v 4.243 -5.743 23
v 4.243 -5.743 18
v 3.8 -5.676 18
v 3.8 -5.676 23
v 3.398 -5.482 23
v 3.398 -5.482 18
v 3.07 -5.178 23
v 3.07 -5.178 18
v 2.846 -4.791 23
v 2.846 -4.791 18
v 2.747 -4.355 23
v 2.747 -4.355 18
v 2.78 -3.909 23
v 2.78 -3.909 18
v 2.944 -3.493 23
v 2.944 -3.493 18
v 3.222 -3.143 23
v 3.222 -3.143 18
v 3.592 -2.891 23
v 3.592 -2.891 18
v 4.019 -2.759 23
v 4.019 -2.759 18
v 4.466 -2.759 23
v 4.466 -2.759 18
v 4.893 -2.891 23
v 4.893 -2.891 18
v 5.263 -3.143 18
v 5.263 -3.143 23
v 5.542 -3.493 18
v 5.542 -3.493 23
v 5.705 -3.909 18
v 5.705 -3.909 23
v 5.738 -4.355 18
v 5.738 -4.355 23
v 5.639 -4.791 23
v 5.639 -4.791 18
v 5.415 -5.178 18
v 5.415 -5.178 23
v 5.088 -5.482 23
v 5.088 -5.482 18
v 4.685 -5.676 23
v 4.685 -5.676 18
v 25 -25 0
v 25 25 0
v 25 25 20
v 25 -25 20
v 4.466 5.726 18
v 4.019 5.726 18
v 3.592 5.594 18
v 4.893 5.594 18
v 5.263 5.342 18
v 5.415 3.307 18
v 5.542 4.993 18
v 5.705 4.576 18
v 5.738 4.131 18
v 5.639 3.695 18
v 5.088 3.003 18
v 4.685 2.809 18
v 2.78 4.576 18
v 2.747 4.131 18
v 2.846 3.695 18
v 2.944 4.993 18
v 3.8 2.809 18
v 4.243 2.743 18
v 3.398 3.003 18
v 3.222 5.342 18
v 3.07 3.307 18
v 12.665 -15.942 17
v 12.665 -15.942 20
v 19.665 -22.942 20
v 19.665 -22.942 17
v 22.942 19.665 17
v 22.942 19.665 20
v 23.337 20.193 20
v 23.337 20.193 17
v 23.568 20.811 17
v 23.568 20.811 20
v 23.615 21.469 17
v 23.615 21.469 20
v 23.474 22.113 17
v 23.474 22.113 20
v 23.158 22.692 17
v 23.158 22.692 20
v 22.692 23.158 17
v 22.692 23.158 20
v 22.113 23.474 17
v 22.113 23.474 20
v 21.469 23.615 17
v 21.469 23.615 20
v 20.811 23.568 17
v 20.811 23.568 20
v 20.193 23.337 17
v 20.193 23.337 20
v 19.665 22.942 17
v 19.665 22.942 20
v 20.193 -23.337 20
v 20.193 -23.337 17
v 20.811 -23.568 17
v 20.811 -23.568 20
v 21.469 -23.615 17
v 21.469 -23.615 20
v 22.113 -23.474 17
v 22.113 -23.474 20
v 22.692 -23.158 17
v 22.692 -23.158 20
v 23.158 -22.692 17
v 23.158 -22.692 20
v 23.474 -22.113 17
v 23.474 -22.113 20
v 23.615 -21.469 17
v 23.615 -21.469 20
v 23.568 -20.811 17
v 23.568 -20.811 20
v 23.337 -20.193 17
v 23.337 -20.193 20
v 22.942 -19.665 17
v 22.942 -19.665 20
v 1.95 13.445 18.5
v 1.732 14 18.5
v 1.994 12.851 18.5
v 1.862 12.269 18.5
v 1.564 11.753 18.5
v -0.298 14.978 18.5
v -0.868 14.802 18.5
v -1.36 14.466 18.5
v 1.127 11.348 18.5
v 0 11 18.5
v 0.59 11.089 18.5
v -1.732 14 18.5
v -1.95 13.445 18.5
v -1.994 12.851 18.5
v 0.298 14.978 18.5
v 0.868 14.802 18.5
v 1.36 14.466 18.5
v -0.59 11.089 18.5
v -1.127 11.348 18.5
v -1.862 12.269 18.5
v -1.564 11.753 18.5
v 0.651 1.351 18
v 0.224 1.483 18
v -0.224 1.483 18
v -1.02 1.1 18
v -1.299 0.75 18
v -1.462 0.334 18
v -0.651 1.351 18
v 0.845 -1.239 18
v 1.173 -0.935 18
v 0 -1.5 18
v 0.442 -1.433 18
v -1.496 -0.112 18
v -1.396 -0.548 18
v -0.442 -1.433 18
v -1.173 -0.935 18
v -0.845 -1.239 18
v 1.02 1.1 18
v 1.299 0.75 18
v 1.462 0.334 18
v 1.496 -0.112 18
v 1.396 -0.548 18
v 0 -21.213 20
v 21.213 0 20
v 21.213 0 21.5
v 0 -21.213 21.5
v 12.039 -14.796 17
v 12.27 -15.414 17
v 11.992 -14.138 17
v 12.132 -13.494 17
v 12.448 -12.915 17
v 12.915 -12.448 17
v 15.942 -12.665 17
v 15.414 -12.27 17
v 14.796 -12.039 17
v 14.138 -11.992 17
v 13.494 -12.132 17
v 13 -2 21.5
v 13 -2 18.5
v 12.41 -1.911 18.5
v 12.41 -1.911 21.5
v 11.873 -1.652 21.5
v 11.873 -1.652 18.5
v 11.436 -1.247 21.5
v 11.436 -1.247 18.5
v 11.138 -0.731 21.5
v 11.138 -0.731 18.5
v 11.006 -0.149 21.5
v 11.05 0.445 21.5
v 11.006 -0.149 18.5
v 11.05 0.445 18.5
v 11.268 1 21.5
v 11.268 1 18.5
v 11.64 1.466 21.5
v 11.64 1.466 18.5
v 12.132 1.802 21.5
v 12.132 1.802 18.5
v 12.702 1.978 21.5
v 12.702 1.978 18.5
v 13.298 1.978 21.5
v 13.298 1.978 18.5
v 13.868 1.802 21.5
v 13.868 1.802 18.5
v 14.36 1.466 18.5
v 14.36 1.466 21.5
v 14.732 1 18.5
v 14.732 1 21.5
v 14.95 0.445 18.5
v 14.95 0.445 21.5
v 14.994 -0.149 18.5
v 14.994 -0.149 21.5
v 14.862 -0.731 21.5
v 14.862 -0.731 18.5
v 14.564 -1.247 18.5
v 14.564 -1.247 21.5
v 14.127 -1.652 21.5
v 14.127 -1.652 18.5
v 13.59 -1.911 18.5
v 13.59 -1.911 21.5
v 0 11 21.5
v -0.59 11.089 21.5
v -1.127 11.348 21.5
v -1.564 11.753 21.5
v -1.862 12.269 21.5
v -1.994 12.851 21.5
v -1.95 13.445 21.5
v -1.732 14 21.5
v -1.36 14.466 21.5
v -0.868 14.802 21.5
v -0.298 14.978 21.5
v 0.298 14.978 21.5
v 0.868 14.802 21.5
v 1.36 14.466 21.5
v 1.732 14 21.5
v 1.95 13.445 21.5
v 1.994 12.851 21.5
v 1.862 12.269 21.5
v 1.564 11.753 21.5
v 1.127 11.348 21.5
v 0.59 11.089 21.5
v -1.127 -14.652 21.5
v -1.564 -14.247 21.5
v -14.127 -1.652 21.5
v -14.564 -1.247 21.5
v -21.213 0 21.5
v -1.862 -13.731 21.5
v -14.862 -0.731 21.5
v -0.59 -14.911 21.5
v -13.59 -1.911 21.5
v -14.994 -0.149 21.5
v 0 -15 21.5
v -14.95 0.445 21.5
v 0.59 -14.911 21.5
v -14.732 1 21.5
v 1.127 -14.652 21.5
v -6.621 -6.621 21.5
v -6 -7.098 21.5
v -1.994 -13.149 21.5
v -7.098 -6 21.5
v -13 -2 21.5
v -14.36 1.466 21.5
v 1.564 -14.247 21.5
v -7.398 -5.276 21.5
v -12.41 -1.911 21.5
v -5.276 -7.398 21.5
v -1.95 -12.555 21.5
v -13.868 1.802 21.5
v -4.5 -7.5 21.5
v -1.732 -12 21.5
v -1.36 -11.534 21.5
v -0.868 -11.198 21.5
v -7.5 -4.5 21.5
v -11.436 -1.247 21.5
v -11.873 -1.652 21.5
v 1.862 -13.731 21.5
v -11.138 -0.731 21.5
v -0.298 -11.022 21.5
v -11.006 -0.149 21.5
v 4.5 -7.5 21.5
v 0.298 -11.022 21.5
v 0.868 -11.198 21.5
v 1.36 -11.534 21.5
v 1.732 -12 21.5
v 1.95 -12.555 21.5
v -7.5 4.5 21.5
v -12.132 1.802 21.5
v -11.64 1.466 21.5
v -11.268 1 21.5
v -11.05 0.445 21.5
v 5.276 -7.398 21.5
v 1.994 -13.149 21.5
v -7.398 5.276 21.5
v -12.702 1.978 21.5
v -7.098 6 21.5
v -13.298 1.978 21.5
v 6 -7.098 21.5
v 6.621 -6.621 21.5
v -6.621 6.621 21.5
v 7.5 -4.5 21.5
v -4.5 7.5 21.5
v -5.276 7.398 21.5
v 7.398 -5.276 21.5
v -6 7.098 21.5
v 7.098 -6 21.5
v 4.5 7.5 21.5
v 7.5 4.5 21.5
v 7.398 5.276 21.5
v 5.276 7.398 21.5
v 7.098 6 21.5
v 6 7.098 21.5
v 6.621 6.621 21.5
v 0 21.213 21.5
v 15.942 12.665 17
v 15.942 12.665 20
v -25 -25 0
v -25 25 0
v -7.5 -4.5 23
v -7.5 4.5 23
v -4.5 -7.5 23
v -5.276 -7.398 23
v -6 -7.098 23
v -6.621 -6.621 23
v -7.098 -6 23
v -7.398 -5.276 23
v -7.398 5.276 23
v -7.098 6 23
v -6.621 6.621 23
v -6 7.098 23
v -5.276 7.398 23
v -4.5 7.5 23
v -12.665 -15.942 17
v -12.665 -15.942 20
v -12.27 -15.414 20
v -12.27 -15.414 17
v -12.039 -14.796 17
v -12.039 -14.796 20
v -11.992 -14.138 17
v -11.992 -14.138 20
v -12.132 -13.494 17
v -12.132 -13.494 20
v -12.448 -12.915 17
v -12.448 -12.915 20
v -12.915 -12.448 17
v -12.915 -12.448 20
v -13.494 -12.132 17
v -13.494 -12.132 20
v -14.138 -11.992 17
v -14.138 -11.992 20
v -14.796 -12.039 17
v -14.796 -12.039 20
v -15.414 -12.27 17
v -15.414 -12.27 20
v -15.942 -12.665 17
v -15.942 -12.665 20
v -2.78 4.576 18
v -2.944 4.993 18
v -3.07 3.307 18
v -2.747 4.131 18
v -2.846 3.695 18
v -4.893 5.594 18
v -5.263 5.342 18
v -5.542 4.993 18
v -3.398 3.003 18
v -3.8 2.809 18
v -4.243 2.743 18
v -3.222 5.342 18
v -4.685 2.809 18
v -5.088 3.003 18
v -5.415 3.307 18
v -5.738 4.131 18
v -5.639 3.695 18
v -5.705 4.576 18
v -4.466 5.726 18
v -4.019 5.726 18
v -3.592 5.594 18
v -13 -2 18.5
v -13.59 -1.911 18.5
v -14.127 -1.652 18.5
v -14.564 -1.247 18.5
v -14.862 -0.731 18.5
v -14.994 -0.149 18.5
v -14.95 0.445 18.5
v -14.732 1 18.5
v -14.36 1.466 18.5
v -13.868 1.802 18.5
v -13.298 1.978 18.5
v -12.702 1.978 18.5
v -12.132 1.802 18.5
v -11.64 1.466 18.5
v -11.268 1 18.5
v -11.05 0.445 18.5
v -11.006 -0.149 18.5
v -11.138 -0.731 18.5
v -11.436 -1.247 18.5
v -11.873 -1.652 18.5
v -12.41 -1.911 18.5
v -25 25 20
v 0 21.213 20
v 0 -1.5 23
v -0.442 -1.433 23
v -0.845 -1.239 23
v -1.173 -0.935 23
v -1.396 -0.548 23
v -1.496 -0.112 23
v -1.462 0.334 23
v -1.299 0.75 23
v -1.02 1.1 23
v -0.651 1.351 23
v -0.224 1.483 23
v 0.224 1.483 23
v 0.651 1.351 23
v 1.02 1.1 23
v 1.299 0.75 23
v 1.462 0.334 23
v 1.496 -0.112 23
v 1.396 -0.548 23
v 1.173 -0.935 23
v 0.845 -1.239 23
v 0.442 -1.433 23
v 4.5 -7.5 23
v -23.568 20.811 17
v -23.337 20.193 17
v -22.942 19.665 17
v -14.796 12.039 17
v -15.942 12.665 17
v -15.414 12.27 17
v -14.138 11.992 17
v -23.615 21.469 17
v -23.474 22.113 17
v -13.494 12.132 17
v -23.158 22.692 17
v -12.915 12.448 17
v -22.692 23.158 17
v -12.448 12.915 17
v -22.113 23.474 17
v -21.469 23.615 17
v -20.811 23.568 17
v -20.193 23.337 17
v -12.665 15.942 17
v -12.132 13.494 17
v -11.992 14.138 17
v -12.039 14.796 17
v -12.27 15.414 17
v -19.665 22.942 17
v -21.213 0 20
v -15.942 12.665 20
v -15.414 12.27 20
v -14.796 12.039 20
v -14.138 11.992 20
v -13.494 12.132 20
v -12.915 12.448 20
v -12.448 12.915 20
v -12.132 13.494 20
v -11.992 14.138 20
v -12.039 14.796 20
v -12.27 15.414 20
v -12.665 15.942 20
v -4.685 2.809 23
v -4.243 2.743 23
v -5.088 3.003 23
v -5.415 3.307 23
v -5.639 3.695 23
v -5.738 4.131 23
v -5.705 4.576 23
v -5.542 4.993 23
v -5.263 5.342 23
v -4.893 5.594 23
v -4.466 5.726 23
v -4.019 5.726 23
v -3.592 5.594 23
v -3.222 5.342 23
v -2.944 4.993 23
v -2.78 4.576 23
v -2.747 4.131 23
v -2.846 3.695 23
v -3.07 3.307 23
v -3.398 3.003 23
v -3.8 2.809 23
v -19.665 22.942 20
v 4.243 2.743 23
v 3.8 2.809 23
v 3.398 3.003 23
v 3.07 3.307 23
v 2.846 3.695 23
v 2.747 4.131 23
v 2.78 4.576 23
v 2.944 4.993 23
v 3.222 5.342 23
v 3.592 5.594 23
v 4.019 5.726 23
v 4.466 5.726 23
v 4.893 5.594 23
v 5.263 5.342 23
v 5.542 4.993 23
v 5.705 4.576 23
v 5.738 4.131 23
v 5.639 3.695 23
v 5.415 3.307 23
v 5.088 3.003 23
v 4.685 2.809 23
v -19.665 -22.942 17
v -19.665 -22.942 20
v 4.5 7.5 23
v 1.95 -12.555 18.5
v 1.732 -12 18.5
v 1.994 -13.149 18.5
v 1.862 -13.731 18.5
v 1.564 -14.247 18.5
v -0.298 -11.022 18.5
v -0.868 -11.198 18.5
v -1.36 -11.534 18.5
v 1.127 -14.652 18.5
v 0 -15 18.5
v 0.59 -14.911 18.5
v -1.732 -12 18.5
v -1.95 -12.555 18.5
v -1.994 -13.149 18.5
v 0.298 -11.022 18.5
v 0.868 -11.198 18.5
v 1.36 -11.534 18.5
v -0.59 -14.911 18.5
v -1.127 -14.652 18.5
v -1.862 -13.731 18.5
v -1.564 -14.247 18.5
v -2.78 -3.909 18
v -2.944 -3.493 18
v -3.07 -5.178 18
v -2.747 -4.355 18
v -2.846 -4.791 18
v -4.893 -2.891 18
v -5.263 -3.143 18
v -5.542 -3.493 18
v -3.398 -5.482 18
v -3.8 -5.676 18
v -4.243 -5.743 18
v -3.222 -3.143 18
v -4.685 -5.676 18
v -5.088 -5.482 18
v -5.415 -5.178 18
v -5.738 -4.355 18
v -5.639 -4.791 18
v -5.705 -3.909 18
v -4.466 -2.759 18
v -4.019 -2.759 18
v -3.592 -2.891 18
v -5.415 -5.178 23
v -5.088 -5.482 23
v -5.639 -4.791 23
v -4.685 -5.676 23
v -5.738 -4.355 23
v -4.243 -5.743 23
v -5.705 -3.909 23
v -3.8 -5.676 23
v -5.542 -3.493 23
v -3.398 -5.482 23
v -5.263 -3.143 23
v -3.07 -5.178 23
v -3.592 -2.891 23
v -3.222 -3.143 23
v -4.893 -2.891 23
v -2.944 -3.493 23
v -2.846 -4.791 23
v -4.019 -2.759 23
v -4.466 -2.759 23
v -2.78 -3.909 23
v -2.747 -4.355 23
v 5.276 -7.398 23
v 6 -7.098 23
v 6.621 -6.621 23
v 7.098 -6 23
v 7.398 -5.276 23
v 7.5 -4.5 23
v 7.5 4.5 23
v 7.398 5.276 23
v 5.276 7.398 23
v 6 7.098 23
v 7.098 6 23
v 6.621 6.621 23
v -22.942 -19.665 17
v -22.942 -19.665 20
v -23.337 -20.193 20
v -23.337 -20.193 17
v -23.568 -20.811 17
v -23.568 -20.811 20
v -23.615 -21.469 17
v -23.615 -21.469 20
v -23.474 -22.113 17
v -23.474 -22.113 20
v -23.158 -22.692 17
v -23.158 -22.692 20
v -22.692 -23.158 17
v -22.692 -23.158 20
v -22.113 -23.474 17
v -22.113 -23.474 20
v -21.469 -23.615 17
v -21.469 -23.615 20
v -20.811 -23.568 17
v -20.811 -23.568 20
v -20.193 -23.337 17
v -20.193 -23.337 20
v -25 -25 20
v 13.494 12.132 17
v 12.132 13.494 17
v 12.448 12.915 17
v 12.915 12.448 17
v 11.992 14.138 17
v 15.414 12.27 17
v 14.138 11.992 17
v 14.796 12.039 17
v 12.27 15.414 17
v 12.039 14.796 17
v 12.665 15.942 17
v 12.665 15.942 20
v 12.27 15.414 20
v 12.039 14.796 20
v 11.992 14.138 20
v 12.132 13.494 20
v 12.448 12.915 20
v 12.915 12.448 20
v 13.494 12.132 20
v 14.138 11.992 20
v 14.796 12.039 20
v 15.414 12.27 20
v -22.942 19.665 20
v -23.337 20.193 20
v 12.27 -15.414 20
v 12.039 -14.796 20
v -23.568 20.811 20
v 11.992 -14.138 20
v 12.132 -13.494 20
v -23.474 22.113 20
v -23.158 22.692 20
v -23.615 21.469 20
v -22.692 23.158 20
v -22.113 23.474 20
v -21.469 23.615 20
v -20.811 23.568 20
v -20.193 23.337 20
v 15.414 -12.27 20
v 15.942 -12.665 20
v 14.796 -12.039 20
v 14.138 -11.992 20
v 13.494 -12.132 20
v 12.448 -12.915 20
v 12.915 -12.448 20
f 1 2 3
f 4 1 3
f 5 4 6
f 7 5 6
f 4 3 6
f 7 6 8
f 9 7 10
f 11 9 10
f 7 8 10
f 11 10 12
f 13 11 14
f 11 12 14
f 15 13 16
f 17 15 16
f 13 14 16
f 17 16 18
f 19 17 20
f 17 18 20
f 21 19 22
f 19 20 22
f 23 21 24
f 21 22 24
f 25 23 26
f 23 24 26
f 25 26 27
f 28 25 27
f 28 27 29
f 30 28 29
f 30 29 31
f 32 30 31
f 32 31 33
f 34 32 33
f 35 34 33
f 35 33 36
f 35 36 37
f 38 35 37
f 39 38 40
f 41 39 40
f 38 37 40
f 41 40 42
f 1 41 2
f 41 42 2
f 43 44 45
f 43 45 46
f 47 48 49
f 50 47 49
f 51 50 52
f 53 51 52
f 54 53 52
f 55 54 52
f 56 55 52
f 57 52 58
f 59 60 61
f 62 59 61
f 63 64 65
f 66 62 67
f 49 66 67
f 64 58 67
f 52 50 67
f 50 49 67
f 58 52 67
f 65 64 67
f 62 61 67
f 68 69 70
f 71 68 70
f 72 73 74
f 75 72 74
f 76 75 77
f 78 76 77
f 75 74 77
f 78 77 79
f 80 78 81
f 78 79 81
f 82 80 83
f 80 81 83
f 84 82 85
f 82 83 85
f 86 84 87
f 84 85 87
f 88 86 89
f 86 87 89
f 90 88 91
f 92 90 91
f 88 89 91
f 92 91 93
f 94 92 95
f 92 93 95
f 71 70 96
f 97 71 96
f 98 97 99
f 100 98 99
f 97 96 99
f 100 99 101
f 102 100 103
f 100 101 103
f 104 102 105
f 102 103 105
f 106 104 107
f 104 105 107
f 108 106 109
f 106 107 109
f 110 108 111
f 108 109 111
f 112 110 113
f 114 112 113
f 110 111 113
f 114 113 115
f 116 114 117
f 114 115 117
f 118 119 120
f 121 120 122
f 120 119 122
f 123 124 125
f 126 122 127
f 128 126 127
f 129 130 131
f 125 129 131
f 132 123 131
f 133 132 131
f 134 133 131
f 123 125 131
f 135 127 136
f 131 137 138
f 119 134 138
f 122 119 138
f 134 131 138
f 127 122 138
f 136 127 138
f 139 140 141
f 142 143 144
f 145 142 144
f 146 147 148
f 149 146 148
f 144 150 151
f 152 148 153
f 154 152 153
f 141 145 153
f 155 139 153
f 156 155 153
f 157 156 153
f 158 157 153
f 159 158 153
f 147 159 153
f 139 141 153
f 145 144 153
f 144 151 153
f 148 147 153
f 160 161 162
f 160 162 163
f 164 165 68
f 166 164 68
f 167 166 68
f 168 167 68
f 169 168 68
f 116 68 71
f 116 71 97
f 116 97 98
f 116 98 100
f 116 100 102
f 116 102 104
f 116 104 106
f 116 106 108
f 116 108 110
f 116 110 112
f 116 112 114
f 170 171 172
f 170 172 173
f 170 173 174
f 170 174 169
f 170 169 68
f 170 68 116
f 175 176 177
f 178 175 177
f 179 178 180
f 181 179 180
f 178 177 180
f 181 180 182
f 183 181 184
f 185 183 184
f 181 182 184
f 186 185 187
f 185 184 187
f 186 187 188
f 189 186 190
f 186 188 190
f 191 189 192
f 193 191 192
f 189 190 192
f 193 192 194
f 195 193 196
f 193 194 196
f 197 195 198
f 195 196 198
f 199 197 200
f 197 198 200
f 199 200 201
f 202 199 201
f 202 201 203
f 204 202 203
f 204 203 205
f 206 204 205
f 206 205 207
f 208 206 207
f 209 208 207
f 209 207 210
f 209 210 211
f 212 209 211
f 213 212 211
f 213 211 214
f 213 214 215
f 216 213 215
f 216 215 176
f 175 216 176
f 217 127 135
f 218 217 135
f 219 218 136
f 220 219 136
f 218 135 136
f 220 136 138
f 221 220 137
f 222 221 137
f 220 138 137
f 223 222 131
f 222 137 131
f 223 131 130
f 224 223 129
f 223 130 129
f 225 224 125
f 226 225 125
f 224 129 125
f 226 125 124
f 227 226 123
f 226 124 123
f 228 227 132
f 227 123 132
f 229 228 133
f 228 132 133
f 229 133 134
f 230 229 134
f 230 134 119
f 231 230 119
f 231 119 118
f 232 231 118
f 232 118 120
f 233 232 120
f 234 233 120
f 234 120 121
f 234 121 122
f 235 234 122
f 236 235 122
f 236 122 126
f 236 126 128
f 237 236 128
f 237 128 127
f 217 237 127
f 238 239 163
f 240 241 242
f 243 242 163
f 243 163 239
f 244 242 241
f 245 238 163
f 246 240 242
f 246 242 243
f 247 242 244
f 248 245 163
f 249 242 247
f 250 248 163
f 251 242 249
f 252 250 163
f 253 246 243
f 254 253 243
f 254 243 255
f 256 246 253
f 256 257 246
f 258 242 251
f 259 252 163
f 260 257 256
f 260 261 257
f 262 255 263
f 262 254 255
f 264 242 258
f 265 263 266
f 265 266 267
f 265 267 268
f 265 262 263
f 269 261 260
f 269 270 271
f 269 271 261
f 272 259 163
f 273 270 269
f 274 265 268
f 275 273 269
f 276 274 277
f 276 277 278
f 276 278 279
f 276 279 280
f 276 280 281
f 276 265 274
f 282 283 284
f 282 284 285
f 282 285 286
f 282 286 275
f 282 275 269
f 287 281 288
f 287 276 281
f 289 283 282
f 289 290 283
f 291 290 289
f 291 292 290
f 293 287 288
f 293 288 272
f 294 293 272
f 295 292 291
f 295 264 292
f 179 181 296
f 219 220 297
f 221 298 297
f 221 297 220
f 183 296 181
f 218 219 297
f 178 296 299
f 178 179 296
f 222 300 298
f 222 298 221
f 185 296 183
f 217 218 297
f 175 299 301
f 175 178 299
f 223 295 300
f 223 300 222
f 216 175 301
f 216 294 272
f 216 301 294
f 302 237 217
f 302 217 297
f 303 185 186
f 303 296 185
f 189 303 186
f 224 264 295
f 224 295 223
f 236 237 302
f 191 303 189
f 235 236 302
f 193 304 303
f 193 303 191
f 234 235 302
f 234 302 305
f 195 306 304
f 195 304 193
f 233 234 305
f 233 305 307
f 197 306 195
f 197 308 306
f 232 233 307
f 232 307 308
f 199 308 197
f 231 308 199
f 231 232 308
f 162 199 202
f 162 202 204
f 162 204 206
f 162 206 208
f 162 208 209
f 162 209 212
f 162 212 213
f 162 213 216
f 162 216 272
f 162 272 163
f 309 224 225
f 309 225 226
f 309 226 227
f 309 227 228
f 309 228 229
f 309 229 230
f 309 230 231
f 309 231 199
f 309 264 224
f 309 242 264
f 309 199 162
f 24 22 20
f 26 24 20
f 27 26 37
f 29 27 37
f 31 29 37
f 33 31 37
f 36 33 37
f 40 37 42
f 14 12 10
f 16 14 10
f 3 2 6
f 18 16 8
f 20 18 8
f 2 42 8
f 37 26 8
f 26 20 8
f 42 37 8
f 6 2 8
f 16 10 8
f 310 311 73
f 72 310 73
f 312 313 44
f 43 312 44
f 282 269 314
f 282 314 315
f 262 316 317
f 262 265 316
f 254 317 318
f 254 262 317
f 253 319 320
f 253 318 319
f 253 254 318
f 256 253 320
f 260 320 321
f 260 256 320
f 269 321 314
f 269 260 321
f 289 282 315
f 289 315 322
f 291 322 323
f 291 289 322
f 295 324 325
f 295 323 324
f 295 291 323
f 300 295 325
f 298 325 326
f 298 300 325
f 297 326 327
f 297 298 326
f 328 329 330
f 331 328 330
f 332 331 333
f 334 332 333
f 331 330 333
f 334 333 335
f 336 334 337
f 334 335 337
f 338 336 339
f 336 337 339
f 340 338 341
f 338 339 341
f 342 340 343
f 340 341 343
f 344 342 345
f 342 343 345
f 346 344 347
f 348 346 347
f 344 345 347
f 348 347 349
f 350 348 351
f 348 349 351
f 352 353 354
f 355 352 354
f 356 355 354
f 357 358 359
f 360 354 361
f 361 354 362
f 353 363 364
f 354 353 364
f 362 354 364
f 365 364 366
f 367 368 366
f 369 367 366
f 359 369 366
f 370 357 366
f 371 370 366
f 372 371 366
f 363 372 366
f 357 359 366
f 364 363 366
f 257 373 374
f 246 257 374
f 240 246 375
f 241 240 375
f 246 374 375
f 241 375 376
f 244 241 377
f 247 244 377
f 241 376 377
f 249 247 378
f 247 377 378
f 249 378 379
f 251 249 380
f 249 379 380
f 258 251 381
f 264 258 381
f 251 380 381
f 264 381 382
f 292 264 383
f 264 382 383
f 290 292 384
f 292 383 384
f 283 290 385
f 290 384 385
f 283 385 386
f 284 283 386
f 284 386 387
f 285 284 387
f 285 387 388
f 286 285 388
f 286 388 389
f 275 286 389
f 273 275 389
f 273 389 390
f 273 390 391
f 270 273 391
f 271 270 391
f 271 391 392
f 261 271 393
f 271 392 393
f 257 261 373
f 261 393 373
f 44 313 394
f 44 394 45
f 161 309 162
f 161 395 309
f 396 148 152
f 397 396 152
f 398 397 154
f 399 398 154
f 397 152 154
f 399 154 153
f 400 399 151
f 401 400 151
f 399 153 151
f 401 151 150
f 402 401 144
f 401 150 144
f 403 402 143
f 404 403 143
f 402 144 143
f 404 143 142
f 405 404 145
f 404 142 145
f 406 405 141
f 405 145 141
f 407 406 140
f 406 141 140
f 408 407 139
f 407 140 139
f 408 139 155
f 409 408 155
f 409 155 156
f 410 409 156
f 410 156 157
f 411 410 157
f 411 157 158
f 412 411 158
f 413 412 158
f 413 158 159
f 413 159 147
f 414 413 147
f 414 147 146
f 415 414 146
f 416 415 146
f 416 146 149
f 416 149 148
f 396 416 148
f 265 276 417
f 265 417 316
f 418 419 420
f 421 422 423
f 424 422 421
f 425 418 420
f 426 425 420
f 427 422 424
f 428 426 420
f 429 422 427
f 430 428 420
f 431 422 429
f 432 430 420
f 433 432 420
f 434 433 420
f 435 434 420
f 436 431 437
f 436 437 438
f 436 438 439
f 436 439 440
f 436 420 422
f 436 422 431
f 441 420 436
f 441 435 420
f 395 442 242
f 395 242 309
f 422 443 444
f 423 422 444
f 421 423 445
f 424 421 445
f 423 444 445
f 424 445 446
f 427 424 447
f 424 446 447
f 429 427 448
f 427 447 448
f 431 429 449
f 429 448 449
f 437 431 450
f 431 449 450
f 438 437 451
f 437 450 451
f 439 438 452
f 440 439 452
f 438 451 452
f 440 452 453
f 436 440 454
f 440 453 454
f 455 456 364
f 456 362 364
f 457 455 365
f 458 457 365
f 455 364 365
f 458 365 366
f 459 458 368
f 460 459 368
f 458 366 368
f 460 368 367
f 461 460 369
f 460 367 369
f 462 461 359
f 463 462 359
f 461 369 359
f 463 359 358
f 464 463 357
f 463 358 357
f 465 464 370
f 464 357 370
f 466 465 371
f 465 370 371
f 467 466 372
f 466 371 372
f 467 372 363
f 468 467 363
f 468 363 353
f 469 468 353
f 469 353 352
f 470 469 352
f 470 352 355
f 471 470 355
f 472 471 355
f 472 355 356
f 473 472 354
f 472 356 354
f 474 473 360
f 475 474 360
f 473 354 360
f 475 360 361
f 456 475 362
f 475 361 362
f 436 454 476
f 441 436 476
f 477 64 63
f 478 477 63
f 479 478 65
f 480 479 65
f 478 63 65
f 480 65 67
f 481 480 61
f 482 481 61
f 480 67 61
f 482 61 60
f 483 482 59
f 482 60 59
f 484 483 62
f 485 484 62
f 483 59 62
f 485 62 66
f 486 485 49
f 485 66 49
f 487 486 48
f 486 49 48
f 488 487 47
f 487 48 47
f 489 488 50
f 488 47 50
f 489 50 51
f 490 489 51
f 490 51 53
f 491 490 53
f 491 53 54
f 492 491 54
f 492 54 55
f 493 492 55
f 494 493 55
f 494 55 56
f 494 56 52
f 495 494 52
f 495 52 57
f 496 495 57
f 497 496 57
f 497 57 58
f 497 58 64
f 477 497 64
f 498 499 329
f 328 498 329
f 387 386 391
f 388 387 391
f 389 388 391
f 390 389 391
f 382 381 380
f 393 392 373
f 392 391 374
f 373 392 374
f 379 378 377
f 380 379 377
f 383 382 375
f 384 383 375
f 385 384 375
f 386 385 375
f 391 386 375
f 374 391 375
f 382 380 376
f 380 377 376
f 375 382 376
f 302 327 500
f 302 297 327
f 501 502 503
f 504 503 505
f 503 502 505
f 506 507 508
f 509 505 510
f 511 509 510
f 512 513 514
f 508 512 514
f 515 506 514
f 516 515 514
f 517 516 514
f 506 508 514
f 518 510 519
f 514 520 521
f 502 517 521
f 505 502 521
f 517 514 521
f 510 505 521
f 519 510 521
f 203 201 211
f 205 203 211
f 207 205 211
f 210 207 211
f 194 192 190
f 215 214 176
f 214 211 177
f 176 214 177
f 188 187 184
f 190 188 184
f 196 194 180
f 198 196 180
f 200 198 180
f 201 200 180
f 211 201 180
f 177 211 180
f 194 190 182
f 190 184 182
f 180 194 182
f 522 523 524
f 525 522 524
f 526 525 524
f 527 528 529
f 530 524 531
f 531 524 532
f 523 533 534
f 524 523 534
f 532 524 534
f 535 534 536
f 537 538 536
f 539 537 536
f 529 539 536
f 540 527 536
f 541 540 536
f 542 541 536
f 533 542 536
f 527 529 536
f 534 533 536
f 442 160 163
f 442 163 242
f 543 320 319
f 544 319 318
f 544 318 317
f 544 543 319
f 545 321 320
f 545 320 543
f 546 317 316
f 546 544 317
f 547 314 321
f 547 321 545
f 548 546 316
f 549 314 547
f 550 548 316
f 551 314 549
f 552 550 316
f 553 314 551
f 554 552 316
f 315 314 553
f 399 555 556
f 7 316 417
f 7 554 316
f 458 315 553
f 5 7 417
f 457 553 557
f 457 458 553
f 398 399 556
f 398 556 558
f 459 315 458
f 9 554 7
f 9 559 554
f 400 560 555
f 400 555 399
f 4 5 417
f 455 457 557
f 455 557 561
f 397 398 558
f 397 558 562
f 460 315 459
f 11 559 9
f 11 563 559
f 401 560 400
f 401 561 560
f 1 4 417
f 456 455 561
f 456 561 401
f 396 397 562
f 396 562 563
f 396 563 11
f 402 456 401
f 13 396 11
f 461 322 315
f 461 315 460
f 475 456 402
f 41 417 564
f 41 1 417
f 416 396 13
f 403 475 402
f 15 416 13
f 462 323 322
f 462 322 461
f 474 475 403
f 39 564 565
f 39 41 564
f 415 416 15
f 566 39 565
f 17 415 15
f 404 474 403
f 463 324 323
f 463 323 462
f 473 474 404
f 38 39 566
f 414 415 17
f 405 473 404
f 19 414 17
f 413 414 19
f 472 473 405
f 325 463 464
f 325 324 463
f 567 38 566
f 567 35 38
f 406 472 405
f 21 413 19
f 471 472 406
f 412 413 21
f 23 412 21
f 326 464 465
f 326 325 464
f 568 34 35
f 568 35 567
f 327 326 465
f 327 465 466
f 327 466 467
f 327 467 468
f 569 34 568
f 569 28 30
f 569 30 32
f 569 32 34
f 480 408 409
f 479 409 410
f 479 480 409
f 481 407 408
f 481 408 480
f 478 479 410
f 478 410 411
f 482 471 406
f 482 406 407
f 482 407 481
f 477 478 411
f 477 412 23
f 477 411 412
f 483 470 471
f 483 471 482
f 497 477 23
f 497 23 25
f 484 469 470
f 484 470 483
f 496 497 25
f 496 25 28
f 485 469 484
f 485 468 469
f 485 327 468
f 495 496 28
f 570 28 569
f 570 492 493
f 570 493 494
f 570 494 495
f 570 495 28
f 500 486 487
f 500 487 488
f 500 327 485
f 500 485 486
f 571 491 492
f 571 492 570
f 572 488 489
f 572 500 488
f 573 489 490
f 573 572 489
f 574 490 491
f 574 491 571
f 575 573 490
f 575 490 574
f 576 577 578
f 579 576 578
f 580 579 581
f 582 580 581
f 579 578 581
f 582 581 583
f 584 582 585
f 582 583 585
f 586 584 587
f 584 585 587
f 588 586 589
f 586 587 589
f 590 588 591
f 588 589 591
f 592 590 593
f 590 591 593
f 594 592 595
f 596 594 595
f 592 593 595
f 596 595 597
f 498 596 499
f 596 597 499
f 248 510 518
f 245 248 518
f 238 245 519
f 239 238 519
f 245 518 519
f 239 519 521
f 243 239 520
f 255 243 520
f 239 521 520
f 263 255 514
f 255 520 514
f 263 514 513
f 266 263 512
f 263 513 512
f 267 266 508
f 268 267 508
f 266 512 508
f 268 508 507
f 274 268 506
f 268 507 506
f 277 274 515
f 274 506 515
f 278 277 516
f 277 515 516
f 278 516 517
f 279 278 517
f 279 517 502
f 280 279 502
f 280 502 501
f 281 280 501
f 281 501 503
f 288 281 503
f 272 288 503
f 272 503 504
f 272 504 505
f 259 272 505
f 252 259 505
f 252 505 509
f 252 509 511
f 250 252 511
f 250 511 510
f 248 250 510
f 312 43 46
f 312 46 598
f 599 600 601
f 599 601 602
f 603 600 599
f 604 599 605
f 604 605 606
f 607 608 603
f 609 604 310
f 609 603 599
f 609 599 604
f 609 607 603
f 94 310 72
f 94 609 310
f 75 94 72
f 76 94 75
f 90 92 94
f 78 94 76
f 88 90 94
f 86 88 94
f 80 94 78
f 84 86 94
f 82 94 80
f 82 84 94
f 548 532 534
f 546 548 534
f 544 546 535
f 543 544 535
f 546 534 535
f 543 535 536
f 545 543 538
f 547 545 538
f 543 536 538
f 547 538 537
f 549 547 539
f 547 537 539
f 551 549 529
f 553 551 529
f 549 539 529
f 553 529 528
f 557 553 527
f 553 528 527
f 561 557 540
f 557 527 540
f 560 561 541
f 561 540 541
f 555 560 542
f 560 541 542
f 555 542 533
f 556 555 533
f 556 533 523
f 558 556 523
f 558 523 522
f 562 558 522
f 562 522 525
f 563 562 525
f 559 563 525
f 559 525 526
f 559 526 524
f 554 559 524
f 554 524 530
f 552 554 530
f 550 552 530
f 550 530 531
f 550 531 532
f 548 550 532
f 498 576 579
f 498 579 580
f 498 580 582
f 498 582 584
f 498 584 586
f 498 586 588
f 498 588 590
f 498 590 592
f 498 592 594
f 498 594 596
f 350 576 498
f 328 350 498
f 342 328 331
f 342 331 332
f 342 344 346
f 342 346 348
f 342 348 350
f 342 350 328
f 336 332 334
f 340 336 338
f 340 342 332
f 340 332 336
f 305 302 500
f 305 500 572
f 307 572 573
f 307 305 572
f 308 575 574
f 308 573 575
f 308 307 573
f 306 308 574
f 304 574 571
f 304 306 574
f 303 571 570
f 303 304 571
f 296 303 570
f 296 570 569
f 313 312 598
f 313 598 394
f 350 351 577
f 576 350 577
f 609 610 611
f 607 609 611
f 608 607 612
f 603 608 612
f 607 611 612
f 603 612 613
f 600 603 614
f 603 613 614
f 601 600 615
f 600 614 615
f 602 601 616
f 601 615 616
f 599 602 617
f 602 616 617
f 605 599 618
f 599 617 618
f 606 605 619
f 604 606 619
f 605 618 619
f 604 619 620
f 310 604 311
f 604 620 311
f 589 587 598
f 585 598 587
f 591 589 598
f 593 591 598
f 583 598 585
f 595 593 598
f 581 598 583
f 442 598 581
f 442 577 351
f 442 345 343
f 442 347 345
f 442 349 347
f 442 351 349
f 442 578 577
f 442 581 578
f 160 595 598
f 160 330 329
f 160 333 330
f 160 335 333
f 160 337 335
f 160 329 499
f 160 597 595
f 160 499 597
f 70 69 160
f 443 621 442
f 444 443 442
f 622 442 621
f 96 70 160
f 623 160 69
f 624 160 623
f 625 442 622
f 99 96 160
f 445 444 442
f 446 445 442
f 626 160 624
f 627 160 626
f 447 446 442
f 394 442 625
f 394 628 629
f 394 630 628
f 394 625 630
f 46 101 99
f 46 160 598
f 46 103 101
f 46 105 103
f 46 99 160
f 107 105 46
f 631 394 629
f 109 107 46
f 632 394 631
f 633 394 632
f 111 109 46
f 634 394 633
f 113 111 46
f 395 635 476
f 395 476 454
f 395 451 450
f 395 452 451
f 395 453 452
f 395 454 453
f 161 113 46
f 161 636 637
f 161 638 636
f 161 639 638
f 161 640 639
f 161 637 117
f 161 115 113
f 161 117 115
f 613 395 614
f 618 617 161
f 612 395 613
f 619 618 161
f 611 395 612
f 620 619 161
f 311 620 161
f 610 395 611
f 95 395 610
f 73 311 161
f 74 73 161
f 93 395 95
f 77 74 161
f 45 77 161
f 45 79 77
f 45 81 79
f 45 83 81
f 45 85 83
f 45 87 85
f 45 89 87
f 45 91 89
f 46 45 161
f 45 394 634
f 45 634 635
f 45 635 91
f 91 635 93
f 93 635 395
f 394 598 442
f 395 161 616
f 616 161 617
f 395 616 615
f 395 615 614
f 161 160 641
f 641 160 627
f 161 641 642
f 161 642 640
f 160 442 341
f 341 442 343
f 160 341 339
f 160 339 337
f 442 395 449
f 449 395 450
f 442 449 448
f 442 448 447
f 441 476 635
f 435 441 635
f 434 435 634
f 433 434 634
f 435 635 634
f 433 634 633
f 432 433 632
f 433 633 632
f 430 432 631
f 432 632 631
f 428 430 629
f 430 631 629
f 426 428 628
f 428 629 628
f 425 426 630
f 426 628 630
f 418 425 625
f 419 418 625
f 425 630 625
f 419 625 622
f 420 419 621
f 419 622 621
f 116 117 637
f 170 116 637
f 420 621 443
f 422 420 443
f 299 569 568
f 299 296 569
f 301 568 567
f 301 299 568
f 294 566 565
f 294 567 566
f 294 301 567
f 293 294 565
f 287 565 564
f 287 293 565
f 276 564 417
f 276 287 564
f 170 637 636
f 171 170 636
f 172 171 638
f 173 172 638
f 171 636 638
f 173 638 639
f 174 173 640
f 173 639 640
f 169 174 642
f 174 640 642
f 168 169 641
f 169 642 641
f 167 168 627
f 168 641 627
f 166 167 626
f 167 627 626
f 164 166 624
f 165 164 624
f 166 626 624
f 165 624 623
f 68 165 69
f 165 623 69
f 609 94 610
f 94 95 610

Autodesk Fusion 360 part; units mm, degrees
sketch "Sketch1" plane through (0, 0, 0) normal (0, 0, 1) x (1, 0, 0)
  line L0 (-25, 25) -> (25, 25)
  line L1 (25, 25) -> (25, -25)
  line L2 (25, -25) -> (-25, -25)
  line L3 (-25, -25) -> (-25, 25)
  line L4 (-25, 25) -> (25, -25) construction
  line L5 (25, 25) -> (-25, -25) construction
  dimension "d1" = 50
  dimension "d2" = 50
extrude "Extrude1" add sketch "Sketch1" along normal blind 20
sketch "Sketch2" plane through (0, 0, 20) normal (0, 0, 1) x (1, 0, 0)
  line L0 (-25, -25) -> (25, -25)
  line L1 (25, -25) -> (25, 25)
  line L2 (25, 25) -> (-25, 25)
  line L3 (-25, 25) -> (-25, -25)
  line L4 (21.2132, 0) -> (0, -21.2132)
  line L5 (0, -21.2132) -> (-21.2132, 0)
  line L6 (-21.2132, 0) -> (0, 21.2132)
  line L7 (0, 21.2132) -> (21.2132, 0)
  line L8 (0, -25) -> (0, 25) construction
  line L9 (0, -21.2132) -> (0, 21.2132) construction
  line L10 (21.2132, 0) -> (-21.2132, 0) construction
  line L11 (25, 0) -> (-25, 0) construction
  dimension "d5" = 30
  dimension "d6" = 30
extrude "Extrude2" add sketch "Sketch2" along normal blind 1.5 contours L4 L5 L6 L7
sketch "Sketch3" plane through (0, 0, 21.5) normal (0, 0, 1) x (1, 0, 0)
  line L0 (0, 21.2132) -> (-21.2132, 0)
  line L1 (-21.2132, 0) -> (0, -21.2132)
  line L2 (0, -21.2132) -> (21.2132, 0)
  line L3 (21.2132, 0) -> (0, 21.2132)
  circle A0 centre (0, 0) radius 13 construction
  circle A1 centre (0, -13) radius 2.5
  circle A2 centre (-13, 0) radius 2.5
  circle A3 centre (0, 13) radius 2.5
  circle A4 centre (13, 0) radius 2.5
  dimension "d9" = 26
  dimension "d10" = 5
hole "Hole1" at (-13, 0, 21.5) at (0, -13, 21.5) at (0, 13, 21.5) at (13, 0, 21.5) direction (0, 0, -1) diameter 4 depth 3 tip angle 180
sketch "Sketch4" plane through (0, 0, 21.5) normal (0, 0, 1) x (1, 0, 0)
  circle A0 centre (0, 13) radius 2
  circle A1 centre (-13, 0) radius 2
  circle A2 centre (0, -13) radius 2
  circle A3 centre (13, 0) radius 2
  line L0 (0, 21.2132) -> (-21.2132, 0)
  line L1 (-21.2132, 0) -> (0, -21.2132)
  line L2 (0, -21.2132) -> (21.2132, 0)
  line L3 (21.2132, 0) -> (0, 21.2132)
  line L4 (4.5, -7.5) -> (-4.5, -7.5)
  line L5 (-7.5, -4.5) -> (-7.5, 4.5)
  line L6 (-4.5, 7.5) -> (4.5, 7.5)
  line L7 (7.5, 4.5) -> (7.5, -4.5)
  line L8 (7.5, -7.5) -> (-7.5, 7.5) construction
  line L9 (-7.5, -7.5) -> (7.5, 7.5) construction
  arc A4 (4.5, -7.5) -> (7.5, -4.5) centre (4.5, -4.5) ccw
  arc A5 (-7.5, -4.5) -> (-4.5, -7.5) centre (-4.5, -4.5) ccw
  arc A6 (7.5, 4.5) -> (4.5, 7.5) centre (4.5, 4.5) ccw
  arc A7 (-4.5, 7.5) -> (-7.5, 4.5) centre (-4.5, 4.5) ccw
  dimension "d14" = 15
  dimension "d15" = 15
  dimension "d16" = 3
  dimension "d17" = 3
  dimension "d18" = 3
  dimension "d19" = 3
extrude "Extrude3" add sketch "Sketch4" along normal blind 1.5 contours L4 L5 L6 L7 A4 A5 A6 A7
sketch "Sketch5" plane through (0, 0, 23) normal (0, 0, 1) x (1, 0, 0)
  arc A0 (7.5, 4.5) -> (4.5, 7.5) centre (4.5, 4.5) ccw
  line L0 (4.5, 7.5) -> (-4.5, 7.5)
  arc A1 (-4.5, 7.5) -> (-7.5, 4.5) centre (-4.5, 4.5) ccw
  line L1 (-7.5, 4.5) -> (-7.5, -4.5)
  arc A2 (-7.5, -4.5) -> (-4.5, -7.5) centre (-4.5, -4.5) ccw
  line L2 (-4.5, -7.5) -> (4.5, -7.5)
  arc A3 (4.5, -7.5) -> (7.5, -4.5) centre (4.5, -4.5) ccw
  line L3 (7.5, -4.5) -> (7.5, 4.5)
  circle A4 centre (0, 0) radius 6 construction
  line L4 (6.6213, -6.6213) -> (-6.6213, 6.6213) construction
  line L5 (-6.6213, -6.6213) -> (6.6213, 6.6213) construction
  circle A5 centre (0, 0) radius 1.5
  circle A6 centre (-4.2426, -4.2426) radius 1.5
  circle A7 centre (4.2426, -4.2426) radius 1.5
  circle A8 centre (4.2426, 4.2426) radius 1.5
  circle A9 centre (-4.2426, 4.2426) radius 1.5
  dimension "d22" = 12
  dimension "d23" = 3
hole "Hole2" at (-4.2426, -4.2426, 23) at (4.2426, -4.2426, 23) at (-4.2426, 4.2426, 23) at (4.2426, 4.2426, 23) at (0, 0, 23) direction (0, 0, -1) diameter 3 depth 5 tip angle 180
sketch "Sketch6" plane through (0, 0, 20) normal (0, 0, 1) x (1, 0, 0)
  line L0 (0, 21.2132) -> (21.2132, 0)
  line L1 (21.2132, 0) -> (0, -21.2132)
  line L2 (0, -21.2132) -> (-21.2132, 0)
  line L3 (-21.2132, 0) -> (0, 21.2132)
  line L4 (-25, -25) -> (25, -25)
  line L5 (25, -25) -> (25, 25)
  line L6 (25, 25) -> (-25, 25)
  line L7 (-25, 25) -> (-25, -25)
  line L8 (-25, -25) -> (-10.6066, -10.6066) construction
  line L9 (-19.6648, -22.9418) -> (-12.6648, -15.9418)
  arc A0 (-12.6648, -15.9418) -> (-15.9418, -12.6648) centre (-14.3033, -14.3033) ccw
  line L10 (-15.9418, -12.6648) -> (-22.9418, -19.6648)
  arc A1 (-22.9418, -19.6648) -> (-19.6648, -22.9418) centre (-21.3033, -21.3033) ccw
  line L11 (-21.3033, -21.3033) -> (-14.3033, -14.3033) construction
  line L12 (12.6648, -15.9418) -> (19.6648, -22.9418)
  arc A2 (19.6648, -22.9418) -> (22.9418, -19.6648) centre (21.3033, -21.3033) ccw
  line L13 (22.9418, -19.6648) -> (15.9418, -12.6648)
  arc A3 (15.9418, -12.6648) -> (12.6648, -15.9418) centre (14.3033, -14.3033) ccw
  line L14 (15.9418, 12.6648) -> (22.9418, 19.6648)
  arc A4 (22.9418, 19.6648) -> (19.6648, 22.9418) centre (21.3033, 21.3033) ccw
  line L15 (19.6648, 22.9418) -> (12.6648, 15.9418)
  arc A5 (12.6648, 15.9418) -> (15.9418, 12.6648) centre (14.3033, 14.3033) ccw
  line L16 (-12.6648, 15.9418) -> (-19.6648, 22.9418)
  arc A6 (-19.6648, 22.9418) -> (-22.9418, 19.6648) centre (-21.3033, 21.3033) ccw
  line L17 (-22.9418, 19.6648) -> (-15.9418, 12.6648)
  arc A7 (-15.9418, 12.6648) -> (-12.6648, 15.9418) centre (-14.3033, 14.3033) ccw
  dimension "d28" = 360
extrude "Extrude4" cut sketch "Sketch6" against normal blind 3 contours L9 A0 L10 A1 | L12 A2 L13 A3 | L14 A4 L15 A5 | L16 A6 L17 A7
